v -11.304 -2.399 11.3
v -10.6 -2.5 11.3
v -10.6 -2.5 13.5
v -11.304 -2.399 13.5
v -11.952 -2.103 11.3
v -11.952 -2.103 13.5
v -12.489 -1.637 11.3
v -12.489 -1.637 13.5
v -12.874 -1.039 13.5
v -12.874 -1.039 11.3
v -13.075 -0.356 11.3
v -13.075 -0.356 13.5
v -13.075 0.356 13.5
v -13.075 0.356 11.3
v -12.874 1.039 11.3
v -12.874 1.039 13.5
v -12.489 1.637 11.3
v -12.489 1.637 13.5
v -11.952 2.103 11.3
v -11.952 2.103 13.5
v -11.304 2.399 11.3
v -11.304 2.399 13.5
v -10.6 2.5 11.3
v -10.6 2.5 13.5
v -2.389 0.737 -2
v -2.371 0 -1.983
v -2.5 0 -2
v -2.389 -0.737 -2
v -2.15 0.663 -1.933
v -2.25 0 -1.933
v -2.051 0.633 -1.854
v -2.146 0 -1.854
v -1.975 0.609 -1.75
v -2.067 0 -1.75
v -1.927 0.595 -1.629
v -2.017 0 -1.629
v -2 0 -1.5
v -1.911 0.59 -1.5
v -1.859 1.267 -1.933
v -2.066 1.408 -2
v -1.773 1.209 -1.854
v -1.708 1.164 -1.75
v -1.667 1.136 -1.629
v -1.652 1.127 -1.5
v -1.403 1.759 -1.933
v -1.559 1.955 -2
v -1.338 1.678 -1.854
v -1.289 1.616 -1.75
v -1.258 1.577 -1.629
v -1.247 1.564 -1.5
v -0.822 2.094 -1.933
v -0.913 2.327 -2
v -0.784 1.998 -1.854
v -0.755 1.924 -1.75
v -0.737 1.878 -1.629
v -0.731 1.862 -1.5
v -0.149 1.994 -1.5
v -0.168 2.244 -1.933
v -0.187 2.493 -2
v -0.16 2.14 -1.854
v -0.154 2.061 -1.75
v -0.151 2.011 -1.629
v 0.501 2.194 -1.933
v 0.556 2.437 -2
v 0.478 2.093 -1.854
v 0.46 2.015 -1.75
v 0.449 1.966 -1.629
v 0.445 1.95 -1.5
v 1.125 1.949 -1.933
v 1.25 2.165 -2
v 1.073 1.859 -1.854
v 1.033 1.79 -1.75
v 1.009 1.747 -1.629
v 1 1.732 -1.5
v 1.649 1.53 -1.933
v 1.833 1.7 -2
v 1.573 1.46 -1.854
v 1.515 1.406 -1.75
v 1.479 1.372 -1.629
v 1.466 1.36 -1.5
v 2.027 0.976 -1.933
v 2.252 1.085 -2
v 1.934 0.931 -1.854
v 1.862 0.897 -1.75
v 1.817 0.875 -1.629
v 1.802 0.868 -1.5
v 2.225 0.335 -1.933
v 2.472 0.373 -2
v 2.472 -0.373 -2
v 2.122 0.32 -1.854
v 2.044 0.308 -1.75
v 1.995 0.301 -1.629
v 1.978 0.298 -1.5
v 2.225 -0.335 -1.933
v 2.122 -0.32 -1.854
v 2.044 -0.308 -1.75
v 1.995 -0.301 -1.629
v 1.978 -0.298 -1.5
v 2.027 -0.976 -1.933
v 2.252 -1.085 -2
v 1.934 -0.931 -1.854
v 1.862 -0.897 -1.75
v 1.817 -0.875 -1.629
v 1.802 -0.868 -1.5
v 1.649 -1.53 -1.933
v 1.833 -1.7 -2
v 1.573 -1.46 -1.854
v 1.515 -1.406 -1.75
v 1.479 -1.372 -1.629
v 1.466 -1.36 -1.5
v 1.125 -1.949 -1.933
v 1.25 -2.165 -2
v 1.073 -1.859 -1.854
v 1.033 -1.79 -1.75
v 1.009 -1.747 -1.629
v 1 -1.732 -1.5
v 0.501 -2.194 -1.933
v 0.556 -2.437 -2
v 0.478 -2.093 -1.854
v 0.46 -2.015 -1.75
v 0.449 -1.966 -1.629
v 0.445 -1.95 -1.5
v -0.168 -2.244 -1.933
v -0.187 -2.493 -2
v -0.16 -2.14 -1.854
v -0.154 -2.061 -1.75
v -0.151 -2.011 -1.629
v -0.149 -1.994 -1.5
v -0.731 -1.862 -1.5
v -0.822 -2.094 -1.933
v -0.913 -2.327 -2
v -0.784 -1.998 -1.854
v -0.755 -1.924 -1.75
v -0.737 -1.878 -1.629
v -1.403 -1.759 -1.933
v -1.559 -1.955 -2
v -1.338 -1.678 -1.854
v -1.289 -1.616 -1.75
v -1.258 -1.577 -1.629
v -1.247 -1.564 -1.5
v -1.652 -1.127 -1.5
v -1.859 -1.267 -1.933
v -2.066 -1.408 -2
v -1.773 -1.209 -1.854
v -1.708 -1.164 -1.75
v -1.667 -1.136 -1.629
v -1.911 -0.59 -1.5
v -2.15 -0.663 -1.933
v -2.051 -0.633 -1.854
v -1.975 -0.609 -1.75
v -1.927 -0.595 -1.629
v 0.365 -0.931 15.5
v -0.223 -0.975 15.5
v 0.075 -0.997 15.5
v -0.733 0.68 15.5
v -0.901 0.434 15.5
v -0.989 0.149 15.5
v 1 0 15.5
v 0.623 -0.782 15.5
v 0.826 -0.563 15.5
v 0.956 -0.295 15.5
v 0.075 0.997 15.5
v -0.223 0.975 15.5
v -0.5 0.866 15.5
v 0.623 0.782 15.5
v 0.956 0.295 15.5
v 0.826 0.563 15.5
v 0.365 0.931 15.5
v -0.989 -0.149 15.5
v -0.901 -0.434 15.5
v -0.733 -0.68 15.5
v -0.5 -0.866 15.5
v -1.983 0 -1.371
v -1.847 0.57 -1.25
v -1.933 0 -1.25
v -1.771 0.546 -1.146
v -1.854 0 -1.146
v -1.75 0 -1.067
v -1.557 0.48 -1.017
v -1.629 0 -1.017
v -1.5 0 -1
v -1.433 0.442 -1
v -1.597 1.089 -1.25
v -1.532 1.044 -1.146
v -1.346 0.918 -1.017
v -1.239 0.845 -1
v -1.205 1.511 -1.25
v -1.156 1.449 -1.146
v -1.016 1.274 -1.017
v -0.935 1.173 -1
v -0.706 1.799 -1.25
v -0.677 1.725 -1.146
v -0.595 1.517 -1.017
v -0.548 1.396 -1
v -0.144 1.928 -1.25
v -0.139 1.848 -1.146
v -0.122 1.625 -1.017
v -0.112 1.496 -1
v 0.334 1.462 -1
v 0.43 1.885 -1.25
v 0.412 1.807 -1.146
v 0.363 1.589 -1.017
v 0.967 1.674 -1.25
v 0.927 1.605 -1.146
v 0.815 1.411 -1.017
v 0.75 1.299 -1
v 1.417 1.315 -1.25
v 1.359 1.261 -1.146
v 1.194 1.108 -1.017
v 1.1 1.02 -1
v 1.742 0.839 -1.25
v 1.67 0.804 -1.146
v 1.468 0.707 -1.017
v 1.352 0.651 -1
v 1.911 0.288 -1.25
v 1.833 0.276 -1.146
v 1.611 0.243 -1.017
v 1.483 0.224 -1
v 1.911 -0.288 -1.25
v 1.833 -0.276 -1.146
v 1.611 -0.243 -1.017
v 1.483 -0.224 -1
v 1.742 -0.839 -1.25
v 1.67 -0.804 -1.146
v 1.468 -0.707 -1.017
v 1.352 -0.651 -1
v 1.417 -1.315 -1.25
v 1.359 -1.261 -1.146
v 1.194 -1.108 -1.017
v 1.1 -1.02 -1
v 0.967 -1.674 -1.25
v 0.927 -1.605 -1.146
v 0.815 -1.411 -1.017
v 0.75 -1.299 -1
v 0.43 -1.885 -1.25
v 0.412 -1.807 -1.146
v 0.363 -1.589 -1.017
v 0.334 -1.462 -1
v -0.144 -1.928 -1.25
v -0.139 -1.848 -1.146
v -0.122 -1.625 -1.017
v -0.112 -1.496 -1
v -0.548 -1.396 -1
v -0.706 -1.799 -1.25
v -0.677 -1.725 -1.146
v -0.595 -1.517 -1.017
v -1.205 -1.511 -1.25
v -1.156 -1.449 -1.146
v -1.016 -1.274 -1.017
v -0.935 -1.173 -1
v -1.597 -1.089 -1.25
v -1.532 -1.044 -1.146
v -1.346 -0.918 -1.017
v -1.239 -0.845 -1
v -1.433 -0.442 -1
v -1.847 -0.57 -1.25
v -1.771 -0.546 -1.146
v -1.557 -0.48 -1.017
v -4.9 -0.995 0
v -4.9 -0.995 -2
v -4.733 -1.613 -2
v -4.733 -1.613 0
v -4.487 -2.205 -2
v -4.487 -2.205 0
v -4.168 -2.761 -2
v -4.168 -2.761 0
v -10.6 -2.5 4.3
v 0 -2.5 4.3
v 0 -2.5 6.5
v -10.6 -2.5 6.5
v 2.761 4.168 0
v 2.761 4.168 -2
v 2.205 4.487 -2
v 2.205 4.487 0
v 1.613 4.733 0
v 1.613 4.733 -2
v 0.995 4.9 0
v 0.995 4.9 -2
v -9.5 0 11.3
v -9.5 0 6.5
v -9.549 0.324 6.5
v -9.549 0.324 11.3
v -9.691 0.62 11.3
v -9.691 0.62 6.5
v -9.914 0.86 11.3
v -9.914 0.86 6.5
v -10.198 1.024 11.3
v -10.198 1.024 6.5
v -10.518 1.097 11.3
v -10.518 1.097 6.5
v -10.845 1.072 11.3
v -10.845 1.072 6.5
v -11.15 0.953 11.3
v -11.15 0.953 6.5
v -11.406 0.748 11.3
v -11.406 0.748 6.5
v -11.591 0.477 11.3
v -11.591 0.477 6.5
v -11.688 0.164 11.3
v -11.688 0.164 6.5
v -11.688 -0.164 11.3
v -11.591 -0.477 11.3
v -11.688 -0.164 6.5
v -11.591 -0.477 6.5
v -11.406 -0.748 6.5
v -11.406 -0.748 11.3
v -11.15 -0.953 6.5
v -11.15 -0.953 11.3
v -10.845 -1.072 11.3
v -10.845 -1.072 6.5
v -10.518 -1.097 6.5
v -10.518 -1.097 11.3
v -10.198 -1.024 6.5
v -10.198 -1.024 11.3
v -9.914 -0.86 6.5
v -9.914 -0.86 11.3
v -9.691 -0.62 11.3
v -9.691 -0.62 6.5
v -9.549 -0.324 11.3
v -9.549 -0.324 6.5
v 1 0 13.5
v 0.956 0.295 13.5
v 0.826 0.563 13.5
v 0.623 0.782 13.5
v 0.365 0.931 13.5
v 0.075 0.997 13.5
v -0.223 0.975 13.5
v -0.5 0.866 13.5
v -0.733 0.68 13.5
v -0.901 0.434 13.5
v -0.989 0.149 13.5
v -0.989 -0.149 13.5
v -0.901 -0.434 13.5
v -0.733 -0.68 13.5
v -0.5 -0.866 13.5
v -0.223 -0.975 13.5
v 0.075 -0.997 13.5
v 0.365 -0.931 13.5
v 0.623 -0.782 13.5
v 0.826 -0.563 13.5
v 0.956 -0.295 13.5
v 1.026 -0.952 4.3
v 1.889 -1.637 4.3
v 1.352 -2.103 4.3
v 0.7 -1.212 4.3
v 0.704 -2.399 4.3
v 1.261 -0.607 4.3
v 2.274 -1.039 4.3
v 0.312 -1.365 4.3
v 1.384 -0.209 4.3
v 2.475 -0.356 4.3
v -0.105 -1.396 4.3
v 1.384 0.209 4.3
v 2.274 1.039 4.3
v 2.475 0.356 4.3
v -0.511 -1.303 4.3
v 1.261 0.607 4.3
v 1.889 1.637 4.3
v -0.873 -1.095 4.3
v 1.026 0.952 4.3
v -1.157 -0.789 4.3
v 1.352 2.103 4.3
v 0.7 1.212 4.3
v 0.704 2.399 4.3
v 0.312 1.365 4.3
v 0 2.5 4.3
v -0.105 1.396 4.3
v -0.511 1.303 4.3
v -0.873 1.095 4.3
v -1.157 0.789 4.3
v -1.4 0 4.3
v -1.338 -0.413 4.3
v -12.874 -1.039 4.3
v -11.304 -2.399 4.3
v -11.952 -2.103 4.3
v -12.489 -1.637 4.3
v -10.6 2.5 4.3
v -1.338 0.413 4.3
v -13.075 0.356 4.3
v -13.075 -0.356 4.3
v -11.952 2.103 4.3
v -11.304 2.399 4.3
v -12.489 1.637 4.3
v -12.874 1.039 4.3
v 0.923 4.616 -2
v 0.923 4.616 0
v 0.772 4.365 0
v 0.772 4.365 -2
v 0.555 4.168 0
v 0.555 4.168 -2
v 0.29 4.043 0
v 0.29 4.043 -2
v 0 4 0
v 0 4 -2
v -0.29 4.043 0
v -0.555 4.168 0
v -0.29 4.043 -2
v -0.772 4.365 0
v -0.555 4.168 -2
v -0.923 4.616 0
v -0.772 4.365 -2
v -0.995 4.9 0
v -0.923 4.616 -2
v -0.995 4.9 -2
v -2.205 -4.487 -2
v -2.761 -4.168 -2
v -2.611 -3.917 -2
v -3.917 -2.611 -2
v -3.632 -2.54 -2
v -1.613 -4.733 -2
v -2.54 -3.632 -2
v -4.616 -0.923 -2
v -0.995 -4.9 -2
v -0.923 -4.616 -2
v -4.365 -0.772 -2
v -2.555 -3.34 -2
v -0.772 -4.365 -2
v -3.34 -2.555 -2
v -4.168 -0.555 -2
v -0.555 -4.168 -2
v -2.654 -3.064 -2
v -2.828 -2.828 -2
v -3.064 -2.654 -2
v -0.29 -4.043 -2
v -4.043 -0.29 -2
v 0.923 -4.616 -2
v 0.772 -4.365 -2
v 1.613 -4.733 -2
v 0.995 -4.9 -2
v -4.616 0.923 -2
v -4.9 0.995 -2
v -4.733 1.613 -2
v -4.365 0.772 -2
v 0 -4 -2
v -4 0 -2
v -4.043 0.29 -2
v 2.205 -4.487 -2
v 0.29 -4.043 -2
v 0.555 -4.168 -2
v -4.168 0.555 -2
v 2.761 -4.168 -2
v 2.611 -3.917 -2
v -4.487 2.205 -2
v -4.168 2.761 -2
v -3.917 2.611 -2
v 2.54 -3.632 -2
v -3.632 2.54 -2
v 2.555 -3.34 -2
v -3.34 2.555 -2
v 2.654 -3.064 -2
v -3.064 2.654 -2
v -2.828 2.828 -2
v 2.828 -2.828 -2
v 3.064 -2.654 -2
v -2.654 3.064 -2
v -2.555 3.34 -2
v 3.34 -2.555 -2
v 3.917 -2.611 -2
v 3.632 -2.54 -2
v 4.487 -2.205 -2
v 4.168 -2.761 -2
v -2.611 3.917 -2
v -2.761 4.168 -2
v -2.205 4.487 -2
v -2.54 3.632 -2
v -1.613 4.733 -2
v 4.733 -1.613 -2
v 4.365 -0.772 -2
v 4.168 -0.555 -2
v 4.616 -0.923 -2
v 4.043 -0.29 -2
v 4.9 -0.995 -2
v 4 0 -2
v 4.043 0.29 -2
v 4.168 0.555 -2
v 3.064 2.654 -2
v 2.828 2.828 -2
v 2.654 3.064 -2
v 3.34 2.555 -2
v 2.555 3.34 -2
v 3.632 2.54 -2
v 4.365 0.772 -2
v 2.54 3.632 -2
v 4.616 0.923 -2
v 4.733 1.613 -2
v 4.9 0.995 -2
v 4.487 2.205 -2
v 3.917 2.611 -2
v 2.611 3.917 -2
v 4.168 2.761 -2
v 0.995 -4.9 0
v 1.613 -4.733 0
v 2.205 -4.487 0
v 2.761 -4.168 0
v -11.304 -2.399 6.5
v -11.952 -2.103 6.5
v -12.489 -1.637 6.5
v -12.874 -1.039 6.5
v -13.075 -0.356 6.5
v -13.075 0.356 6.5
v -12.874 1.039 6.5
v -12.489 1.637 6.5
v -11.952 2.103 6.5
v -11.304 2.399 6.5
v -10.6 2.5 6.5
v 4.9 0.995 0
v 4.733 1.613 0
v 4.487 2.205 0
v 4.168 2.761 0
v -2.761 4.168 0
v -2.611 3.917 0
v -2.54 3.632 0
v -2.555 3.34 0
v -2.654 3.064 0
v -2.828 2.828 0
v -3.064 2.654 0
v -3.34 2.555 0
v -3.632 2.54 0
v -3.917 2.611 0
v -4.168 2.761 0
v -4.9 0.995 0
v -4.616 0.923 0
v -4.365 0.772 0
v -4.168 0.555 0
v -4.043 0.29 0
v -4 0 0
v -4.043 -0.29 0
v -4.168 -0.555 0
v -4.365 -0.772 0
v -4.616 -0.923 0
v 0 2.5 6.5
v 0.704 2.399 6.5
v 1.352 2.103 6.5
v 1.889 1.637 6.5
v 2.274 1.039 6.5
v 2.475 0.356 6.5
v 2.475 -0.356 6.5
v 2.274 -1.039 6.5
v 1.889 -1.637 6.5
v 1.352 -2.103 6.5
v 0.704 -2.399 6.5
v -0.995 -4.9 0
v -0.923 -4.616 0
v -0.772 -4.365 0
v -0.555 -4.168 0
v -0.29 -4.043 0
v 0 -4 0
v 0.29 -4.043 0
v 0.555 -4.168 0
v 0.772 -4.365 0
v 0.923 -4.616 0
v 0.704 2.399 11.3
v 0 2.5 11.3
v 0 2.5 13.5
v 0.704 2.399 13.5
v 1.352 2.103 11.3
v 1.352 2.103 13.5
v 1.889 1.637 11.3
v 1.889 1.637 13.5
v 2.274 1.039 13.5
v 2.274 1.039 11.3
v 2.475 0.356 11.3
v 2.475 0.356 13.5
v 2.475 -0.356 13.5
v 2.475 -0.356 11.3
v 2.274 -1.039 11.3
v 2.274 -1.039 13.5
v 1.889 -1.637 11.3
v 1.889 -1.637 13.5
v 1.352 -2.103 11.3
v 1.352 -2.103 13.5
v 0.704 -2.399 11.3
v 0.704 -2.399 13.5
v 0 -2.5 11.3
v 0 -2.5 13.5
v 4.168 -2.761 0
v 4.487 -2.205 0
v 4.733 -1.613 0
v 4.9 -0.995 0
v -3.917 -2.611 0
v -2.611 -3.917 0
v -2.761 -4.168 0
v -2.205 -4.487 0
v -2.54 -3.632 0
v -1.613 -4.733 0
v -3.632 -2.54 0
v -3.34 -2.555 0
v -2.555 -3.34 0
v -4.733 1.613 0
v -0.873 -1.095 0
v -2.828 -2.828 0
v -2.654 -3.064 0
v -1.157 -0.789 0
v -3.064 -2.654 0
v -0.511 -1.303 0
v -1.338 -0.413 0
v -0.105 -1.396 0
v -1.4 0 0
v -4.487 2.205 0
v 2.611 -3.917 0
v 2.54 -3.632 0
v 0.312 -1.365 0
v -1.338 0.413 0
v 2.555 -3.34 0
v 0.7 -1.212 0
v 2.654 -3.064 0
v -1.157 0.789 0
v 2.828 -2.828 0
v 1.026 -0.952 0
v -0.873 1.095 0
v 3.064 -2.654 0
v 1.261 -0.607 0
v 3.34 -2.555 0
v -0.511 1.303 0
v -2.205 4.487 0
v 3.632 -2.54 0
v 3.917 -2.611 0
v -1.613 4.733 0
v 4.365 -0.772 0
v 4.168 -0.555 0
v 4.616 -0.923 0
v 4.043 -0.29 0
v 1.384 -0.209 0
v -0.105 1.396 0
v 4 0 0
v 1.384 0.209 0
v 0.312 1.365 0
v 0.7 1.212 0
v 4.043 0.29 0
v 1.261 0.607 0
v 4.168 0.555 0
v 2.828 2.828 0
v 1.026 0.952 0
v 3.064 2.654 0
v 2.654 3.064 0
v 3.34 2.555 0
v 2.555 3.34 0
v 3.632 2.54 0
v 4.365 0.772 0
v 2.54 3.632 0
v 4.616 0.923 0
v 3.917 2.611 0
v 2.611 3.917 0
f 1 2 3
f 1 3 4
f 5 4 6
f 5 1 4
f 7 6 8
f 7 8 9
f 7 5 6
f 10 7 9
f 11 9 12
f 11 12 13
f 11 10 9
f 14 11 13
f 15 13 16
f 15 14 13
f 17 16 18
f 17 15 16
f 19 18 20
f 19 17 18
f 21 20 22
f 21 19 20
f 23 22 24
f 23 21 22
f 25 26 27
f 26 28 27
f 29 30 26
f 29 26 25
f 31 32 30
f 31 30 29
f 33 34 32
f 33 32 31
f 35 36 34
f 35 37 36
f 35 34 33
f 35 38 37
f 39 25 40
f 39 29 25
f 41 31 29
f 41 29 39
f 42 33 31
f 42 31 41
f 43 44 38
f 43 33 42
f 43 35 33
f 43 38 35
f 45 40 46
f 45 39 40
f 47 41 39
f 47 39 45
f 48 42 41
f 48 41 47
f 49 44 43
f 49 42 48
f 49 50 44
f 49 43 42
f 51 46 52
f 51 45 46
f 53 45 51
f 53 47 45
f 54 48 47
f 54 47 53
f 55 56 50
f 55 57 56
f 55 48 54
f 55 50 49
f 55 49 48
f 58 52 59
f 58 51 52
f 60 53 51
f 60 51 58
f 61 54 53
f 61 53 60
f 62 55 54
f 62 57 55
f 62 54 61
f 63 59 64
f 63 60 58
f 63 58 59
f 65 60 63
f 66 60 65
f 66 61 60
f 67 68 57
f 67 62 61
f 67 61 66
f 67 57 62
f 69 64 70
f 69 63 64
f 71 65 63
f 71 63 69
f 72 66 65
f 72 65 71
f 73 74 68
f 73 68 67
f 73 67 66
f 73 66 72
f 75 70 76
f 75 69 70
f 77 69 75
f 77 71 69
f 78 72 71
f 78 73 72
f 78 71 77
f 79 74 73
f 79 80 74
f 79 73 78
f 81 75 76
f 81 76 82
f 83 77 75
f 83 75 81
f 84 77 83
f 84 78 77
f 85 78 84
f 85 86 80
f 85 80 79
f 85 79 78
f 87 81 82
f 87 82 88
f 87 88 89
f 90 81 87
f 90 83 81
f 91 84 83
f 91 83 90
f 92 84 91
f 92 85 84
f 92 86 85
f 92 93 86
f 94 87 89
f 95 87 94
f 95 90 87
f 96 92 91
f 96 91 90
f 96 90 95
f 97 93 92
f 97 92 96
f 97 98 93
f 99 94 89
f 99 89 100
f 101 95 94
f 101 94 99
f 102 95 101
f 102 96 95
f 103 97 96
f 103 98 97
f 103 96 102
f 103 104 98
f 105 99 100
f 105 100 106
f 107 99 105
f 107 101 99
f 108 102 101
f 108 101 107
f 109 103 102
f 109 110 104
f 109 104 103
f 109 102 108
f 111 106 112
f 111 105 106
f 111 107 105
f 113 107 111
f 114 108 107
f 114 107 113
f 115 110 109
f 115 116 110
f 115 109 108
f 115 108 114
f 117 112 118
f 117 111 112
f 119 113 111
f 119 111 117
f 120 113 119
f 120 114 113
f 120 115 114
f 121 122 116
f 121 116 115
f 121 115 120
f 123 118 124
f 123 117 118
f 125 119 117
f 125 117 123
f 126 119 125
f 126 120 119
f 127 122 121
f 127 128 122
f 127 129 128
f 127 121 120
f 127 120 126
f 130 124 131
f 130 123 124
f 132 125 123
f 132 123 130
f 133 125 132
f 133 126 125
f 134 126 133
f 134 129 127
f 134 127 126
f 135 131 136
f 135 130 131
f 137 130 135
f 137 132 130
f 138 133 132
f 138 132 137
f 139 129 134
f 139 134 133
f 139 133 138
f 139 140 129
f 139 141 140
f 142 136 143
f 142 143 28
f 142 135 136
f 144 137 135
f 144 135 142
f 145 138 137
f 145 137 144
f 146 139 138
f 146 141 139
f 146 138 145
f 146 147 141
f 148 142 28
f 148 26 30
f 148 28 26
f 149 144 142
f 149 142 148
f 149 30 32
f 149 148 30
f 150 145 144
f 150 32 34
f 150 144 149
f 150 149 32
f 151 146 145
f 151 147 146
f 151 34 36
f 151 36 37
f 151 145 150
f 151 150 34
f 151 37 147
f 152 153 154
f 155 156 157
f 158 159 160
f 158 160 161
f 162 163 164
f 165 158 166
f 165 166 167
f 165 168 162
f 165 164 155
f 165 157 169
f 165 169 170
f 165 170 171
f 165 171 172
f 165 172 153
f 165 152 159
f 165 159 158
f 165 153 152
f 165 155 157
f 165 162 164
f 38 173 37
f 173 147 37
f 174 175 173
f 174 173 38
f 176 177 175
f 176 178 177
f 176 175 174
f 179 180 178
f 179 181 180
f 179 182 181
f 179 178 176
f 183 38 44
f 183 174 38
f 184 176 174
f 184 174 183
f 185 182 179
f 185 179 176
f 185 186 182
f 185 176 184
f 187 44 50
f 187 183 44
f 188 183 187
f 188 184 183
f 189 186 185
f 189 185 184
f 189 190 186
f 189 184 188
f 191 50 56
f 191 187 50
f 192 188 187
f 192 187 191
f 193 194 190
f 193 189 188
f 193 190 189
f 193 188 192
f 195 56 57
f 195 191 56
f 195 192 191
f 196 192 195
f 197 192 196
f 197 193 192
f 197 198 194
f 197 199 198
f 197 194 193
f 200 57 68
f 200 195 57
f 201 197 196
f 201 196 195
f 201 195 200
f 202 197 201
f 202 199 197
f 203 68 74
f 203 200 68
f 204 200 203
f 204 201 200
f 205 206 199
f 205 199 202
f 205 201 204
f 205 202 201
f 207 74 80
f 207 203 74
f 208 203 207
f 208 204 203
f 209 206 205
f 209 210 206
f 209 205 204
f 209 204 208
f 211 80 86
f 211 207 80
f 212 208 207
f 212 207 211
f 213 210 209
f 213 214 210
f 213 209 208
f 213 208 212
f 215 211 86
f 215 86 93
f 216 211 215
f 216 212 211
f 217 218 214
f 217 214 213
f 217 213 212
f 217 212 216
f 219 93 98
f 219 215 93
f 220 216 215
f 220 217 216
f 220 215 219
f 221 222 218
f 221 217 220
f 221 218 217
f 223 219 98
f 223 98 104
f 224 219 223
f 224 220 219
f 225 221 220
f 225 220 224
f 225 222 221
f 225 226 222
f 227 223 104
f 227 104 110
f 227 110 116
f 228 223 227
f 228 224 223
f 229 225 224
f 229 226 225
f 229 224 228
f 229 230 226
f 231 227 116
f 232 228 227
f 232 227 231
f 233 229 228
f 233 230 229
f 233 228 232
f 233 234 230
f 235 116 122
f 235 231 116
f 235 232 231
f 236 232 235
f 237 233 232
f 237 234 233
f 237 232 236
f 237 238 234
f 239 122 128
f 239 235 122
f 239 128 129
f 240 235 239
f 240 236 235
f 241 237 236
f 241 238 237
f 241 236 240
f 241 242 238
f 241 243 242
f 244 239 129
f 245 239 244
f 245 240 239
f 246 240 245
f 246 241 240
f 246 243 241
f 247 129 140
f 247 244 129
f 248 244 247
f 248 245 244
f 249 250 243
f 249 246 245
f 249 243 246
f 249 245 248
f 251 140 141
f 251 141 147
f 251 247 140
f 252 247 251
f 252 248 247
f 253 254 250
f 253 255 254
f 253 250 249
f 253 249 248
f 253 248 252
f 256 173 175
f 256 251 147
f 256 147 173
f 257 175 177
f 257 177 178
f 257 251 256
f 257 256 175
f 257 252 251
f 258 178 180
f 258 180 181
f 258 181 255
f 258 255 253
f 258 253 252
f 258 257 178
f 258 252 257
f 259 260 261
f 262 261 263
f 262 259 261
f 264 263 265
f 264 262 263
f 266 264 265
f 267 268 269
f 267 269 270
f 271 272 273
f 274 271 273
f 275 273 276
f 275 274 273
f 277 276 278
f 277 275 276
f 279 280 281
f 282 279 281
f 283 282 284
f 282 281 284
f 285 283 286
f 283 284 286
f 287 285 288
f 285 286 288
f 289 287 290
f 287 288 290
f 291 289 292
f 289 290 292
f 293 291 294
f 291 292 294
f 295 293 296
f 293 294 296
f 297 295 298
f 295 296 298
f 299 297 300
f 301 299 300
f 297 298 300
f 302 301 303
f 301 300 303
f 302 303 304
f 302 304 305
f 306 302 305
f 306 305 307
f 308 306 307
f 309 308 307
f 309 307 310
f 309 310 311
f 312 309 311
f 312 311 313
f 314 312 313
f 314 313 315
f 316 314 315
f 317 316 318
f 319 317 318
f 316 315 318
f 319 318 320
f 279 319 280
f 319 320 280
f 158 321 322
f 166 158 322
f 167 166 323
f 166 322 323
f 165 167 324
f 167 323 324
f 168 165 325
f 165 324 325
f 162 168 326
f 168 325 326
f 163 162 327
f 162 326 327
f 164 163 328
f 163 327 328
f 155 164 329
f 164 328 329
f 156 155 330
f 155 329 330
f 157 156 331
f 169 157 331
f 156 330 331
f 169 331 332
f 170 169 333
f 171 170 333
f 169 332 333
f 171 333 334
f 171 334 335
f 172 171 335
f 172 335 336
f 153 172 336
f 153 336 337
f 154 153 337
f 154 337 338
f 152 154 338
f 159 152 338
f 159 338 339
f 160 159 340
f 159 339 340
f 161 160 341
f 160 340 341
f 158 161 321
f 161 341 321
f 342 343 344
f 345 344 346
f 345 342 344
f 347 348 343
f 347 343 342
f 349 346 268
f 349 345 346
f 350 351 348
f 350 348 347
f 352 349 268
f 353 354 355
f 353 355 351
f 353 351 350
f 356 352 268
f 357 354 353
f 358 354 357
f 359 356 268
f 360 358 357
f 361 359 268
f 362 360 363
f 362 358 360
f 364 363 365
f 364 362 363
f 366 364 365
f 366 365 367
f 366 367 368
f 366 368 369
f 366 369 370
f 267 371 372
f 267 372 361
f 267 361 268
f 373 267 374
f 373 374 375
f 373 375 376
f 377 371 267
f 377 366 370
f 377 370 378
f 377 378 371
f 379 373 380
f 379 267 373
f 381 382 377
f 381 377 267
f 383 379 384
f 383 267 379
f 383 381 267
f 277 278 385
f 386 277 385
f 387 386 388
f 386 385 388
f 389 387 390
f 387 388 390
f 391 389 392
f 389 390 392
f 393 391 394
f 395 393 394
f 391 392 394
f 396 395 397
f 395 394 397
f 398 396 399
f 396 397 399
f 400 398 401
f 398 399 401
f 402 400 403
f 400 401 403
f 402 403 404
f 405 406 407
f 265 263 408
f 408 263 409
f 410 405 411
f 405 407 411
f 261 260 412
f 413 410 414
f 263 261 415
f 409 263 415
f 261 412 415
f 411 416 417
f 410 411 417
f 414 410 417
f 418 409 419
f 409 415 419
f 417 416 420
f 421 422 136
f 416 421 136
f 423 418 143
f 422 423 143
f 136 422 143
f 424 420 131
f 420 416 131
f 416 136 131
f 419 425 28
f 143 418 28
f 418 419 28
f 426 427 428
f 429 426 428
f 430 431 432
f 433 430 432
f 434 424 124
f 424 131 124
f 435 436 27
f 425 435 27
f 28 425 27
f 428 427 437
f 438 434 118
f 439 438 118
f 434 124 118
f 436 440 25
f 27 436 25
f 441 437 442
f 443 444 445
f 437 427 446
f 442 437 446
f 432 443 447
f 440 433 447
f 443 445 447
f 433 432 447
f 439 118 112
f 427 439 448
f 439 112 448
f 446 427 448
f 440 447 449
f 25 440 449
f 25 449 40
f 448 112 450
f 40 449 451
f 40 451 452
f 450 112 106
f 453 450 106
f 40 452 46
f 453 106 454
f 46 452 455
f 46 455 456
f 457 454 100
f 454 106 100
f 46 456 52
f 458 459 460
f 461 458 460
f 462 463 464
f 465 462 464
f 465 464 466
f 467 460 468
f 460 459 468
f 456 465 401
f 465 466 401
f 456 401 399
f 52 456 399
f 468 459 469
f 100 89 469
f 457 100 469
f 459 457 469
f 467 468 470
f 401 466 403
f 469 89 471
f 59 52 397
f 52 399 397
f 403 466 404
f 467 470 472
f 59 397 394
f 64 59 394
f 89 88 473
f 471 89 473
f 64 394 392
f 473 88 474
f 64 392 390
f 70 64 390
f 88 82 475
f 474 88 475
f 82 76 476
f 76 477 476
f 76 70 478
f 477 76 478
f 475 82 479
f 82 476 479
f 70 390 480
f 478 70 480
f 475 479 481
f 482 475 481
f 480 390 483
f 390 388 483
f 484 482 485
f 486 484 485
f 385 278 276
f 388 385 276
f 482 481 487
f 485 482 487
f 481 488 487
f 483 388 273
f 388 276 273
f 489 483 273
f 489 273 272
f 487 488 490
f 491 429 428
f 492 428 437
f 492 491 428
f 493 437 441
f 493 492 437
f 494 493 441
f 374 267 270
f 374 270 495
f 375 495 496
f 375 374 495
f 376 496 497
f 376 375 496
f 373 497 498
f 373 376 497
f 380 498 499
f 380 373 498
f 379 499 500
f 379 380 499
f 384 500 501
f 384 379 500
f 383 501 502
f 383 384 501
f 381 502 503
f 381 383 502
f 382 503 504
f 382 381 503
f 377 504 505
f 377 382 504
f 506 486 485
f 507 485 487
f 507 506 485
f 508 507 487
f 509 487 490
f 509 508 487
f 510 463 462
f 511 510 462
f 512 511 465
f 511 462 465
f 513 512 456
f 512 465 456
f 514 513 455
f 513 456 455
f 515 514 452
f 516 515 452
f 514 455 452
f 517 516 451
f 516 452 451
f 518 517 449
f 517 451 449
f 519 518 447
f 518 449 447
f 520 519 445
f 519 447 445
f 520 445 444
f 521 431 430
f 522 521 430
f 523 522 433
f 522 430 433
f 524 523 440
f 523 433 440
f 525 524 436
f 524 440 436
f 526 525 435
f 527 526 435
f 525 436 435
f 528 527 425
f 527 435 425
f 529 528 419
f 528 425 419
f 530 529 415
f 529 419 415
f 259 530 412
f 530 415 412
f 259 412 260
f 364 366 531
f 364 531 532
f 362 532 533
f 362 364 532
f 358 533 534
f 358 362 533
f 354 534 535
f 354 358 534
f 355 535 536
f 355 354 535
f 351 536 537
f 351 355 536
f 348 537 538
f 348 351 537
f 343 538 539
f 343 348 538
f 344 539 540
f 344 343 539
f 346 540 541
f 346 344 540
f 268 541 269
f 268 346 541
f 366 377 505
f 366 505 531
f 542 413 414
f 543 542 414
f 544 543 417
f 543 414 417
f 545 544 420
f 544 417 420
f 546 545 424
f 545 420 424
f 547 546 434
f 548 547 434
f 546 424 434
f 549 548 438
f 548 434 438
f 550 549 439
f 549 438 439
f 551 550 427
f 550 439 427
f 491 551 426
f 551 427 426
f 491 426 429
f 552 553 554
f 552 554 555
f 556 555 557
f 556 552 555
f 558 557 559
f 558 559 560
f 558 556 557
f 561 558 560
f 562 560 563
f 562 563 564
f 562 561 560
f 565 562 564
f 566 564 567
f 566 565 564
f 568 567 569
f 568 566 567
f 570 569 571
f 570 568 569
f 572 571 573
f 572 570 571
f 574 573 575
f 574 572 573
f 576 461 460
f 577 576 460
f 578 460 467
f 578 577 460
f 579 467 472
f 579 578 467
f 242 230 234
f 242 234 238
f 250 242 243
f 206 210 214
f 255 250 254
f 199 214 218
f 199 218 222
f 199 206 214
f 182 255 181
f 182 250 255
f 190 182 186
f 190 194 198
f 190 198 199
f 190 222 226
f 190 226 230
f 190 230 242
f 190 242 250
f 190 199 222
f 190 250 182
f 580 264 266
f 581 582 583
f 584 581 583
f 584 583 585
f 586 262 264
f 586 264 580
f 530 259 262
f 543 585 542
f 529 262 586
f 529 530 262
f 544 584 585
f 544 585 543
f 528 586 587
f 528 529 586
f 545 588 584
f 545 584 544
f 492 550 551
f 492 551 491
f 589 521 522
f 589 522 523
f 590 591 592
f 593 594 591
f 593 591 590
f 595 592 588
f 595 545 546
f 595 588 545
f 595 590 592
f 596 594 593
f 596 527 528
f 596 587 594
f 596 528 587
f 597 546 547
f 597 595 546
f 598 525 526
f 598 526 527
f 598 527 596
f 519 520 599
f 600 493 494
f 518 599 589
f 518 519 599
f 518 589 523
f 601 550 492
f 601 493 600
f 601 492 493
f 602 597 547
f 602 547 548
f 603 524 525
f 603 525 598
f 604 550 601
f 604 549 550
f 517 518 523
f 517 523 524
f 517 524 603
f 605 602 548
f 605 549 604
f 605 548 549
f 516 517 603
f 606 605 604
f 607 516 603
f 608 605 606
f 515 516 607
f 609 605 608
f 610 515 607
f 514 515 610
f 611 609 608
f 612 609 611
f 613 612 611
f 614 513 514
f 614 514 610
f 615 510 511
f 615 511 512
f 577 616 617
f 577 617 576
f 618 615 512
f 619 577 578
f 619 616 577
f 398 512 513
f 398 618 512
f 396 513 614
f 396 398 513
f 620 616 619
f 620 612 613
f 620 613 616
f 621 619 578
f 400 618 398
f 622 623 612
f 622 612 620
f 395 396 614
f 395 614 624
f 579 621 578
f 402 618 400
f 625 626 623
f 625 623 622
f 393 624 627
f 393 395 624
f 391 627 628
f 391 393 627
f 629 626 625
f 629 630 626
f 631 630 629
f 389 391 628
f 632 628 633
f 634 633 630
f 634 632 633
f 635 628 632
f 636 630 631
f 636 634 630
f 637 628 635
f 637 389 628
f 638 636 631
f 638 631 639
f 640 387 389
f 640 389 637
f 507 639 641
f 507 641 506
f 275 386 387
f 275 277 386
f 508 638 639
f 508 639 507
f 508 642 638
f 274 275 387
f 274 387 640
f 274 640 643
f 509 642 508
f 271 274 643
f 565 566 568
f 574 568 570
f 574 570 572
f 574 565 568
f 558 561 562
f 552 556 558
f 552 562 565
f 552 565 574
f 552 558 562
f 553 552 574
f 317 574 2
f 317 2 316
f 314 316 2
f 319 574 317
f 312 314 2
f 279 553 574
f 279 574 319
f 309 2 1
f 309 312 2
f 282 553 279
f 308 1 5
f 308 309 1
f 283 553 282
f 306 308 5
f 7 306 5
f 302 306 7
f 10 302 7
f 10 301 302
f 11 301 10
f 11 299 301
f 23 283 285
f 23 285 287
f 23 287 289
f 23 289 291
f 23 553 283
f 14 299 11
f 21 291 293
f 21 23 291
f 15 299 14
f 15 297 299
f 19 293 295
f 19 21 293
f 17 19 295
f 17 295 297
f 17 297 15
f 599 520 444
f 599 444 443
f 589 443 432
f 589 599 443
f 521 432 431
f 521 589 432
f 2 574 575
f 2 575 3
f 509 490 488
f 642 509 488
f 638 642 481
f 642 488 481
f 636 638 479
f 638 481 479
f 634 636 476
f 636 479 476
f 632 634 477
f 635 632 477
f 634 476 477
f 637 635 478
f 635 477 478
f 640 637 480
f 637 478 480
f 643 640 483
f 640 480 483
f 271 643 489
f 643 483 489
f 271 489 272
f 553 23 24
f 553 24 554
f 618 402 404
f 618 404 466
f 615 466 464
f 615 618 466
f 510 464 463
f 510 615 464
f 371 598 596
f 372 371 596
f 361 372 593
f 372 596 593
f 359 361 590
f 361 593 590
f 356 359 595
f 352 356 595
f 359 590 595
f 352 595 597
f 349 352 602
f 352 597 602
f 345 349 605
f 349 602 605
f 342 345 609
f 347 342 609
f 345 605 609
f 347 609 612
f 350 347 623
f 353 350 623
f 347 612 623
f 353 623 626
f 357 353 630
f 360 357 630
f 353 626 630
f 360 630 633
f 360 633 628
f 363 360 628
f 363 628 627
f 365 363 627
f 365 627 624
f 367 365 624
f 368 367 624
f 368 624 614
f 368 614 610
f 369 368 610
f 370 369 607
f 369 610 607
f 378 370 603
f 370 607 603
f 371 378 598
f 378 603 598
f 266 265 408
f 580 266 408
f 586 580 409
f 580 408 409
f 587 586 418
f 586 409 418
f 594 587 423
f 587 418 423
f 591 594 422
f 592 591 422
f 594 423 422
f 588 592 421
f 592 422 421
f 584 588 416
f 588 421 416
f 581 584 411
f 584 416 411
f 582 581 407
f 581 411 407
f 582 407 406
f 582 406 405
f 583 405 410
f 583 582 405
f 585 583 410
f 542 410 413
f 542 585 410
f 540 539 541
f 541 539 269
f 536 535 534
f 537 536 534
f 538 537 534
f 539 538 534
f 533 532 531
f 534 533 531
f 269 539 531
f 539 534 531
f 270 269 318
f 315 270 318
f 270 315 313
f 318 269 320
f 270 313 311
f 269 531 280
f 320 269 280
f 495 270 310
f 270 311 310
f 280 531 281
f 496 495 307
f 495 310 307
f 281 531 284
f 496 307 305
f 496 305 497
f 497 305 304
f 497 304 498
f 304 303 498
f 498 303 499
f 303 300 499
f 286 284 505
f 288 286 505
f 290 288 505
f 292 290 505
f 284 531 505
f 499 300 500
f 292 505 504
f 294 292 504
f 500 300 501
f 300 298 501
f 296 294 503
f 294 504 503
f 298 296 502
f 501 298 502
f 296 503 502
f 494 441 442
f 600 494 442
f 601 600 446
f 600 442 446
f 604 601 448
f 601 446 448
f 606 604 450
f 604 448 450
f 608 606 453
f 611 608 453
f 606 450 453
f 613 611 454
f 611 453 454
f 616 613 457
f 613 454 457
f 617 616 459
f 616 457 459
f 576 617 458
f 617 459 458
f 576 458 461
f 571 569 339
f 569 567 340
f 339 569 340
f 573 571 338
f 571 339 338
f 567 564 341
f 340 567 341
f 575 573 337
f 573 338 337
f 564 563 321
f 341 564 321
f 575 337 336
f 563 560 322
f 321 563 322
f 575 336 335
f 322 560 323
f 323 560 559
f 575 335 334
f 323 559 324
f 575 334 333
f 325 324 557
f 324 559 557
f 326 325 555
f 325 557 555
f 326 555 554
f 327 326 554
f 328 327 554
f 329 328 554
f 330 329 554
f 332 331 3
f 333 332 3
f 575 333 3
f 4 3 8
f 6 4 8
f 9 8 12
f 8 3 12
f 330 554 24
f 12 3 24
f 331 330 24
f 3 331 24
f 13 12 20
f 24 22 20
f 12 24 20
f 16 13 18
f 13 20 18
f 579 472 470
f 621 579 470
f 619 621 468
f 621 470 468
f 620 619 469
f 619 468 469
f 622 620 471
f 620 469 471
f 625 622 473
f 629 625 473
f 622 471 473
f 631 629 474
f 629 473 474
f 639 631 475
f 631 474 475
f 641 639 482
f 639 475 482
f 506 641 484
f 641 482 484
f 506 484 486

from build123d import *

# Parameters (mm, degrees)
SKETCH1_R           = 5
BOSS_EXTRUDE1_DEPTH = 2
SKETCH2_R           = 1.4
BOSS_EXTRUDE2_DEPTH = 4.3
BOSS_EXTRUDE3_DEPTH = 2.2
SKETCH4_R           = 1.1
BOSS_EXTRUDE4_DEPTH = 4.8
BOSS_EXTRUDE7_DEPTH = 2.2
SKETCH8_R           = 1
BOSS_EXTRUDE8_DEPTH = 2
CUT_EXTRUDE1_REACH  = 24.425
SKETCH9_R           = 1
CIRPATTERN1_COUNT   = 8
SKETCH10_R          = 2
CUT_EXTRUDE3_DEPTH  = 1
FILLET6_R           = 0.5


with BuildPart() as part:
    # Sketch1 → Boss-Extrude1 (new body)
    with BuildSketch(Plane.XY):
        Circle(SKETCH1_R)
    extrude(amount=-BOSS_EXTRUDE1_DEPTH)

    # Sketch2 → Boss-Extrude2 (add)
    with BuildSketch(Plane.XY):
        with Locations(Location((0, 0, 0), (0, 0, 180))):
            Circle(SKETCH2_R)
    extrude(amount=BOSS_EXTRUDE2_DEPTH)

    # Sketch3 → Boss-Extrude3 (add)
    with BuildSketch(Plane.XY.offset(4.3)):
        with BuildLine():
            Line((0, -2.5), (-10.6, -2.5))
            ThreePointArc((-10.6, -2.5), (-13.1, 0), (-10.6, 2.5))
            Line((-10.6, 2.5), (0, 2.5))
            ThreePointArc((0, 2.5), (2.5, 0), (0, -2.5))
        make_face()
    extrude(amount=BOSS_EXTRUDE3_DEPTH)

    # Sketch4 → Boss-Extrude4 (add)
    with BuildSketch(Plane.XY.offset(6.5)):
        with Locations((-10.6, 0)):
            Circle(SKETCH4_R)
    extrude(amount=BOSS_EXTRUDE4_DEPTH)

    # Sketch7 → Boss-Extrude7 (add)
    with BuildSketch(Plane.XY.offset(11.3)):
        with BuildLine():
            Line((-10.6, 2.5), (0, 2.5))
            ThreePointArc((0, 2.5), (2.5, 0), (0, -2.5))
            Line((0, -2.5), (-10.6, -2.5))
            ThreePointArc((-10.6, -2.5), (-13.1, 0), (-10.6, 2.5))
        make_face()
    extrude(amount=BOSS_EXTRUDE7_DEPTH)

    # Sketch8 → Boss-Extrude8 (add)
    with BuildSketch(Plane.XY.offset(13.5)):
        Circle(SKETCH8_R)
    extrude(amount=BOSS_EXTRUDE8_DEPTH)

    # Sketch9 → Cut-Extrude1 (cut, up to next)
    with BuildSketch(Plane(origin=(0, 0, -2), x_dir=(-1, 0, 0), z_dir=(0, 0, -1)), mode=Mode.PRIVATE) as cut_extrude1_sk1:
        with Locations((5, 0)):
            Circle(SKETCH9_R)
    cut_extrude1_tool1 = extrude(cut_extrude1_sk1.sketch, amount=-CUT_EXTRUDE1_REACH, mode=Mode.PRIVATE) & part.part
    cut_extrude1 = cut_extrude1_tool1.solids().sort_by_distance((-5, 0, -2))[0]
    add(cut_extrude1, mode=Mode.SUBTRACT)

    # CirPattern1: Cut-Extrude1 ×8 about axis
    cirpattern1_axis = Axis((0, 0, 0), (0, 0, 1))
    for i in range(1, CIRPATTERN1_COUNT):
        add(cut_extrude1.rotate(cirpattern1_axis, i * 360 / CIRPATTERN1_COUNT), mode=Mode.SUBTRACT)

    # Sketch10 → Cut-Extrude3 (cut)
    with BuildSketch(Plane(origin=(0, 0, -2), x_dir=(-1, 0, 0), z_dir=(0, 0, -1))):
        Circle(SKETCH10_R)
    extrude(amount=-CUT_EXTRUDE3_DEPTH, mode=Mode.SUBTRACT)

    # Fillet6
    fillet6_edges = [part.edges().sort_by_distance(p)[0] for p in [
        (2, 0, -1),
        (2, 0, -2),
    ]]
    fillet(fillet6_edges, radius=FILLET6_R - 0.0001)  # a hair under: the kernel refuses the full size


solid = part.part
